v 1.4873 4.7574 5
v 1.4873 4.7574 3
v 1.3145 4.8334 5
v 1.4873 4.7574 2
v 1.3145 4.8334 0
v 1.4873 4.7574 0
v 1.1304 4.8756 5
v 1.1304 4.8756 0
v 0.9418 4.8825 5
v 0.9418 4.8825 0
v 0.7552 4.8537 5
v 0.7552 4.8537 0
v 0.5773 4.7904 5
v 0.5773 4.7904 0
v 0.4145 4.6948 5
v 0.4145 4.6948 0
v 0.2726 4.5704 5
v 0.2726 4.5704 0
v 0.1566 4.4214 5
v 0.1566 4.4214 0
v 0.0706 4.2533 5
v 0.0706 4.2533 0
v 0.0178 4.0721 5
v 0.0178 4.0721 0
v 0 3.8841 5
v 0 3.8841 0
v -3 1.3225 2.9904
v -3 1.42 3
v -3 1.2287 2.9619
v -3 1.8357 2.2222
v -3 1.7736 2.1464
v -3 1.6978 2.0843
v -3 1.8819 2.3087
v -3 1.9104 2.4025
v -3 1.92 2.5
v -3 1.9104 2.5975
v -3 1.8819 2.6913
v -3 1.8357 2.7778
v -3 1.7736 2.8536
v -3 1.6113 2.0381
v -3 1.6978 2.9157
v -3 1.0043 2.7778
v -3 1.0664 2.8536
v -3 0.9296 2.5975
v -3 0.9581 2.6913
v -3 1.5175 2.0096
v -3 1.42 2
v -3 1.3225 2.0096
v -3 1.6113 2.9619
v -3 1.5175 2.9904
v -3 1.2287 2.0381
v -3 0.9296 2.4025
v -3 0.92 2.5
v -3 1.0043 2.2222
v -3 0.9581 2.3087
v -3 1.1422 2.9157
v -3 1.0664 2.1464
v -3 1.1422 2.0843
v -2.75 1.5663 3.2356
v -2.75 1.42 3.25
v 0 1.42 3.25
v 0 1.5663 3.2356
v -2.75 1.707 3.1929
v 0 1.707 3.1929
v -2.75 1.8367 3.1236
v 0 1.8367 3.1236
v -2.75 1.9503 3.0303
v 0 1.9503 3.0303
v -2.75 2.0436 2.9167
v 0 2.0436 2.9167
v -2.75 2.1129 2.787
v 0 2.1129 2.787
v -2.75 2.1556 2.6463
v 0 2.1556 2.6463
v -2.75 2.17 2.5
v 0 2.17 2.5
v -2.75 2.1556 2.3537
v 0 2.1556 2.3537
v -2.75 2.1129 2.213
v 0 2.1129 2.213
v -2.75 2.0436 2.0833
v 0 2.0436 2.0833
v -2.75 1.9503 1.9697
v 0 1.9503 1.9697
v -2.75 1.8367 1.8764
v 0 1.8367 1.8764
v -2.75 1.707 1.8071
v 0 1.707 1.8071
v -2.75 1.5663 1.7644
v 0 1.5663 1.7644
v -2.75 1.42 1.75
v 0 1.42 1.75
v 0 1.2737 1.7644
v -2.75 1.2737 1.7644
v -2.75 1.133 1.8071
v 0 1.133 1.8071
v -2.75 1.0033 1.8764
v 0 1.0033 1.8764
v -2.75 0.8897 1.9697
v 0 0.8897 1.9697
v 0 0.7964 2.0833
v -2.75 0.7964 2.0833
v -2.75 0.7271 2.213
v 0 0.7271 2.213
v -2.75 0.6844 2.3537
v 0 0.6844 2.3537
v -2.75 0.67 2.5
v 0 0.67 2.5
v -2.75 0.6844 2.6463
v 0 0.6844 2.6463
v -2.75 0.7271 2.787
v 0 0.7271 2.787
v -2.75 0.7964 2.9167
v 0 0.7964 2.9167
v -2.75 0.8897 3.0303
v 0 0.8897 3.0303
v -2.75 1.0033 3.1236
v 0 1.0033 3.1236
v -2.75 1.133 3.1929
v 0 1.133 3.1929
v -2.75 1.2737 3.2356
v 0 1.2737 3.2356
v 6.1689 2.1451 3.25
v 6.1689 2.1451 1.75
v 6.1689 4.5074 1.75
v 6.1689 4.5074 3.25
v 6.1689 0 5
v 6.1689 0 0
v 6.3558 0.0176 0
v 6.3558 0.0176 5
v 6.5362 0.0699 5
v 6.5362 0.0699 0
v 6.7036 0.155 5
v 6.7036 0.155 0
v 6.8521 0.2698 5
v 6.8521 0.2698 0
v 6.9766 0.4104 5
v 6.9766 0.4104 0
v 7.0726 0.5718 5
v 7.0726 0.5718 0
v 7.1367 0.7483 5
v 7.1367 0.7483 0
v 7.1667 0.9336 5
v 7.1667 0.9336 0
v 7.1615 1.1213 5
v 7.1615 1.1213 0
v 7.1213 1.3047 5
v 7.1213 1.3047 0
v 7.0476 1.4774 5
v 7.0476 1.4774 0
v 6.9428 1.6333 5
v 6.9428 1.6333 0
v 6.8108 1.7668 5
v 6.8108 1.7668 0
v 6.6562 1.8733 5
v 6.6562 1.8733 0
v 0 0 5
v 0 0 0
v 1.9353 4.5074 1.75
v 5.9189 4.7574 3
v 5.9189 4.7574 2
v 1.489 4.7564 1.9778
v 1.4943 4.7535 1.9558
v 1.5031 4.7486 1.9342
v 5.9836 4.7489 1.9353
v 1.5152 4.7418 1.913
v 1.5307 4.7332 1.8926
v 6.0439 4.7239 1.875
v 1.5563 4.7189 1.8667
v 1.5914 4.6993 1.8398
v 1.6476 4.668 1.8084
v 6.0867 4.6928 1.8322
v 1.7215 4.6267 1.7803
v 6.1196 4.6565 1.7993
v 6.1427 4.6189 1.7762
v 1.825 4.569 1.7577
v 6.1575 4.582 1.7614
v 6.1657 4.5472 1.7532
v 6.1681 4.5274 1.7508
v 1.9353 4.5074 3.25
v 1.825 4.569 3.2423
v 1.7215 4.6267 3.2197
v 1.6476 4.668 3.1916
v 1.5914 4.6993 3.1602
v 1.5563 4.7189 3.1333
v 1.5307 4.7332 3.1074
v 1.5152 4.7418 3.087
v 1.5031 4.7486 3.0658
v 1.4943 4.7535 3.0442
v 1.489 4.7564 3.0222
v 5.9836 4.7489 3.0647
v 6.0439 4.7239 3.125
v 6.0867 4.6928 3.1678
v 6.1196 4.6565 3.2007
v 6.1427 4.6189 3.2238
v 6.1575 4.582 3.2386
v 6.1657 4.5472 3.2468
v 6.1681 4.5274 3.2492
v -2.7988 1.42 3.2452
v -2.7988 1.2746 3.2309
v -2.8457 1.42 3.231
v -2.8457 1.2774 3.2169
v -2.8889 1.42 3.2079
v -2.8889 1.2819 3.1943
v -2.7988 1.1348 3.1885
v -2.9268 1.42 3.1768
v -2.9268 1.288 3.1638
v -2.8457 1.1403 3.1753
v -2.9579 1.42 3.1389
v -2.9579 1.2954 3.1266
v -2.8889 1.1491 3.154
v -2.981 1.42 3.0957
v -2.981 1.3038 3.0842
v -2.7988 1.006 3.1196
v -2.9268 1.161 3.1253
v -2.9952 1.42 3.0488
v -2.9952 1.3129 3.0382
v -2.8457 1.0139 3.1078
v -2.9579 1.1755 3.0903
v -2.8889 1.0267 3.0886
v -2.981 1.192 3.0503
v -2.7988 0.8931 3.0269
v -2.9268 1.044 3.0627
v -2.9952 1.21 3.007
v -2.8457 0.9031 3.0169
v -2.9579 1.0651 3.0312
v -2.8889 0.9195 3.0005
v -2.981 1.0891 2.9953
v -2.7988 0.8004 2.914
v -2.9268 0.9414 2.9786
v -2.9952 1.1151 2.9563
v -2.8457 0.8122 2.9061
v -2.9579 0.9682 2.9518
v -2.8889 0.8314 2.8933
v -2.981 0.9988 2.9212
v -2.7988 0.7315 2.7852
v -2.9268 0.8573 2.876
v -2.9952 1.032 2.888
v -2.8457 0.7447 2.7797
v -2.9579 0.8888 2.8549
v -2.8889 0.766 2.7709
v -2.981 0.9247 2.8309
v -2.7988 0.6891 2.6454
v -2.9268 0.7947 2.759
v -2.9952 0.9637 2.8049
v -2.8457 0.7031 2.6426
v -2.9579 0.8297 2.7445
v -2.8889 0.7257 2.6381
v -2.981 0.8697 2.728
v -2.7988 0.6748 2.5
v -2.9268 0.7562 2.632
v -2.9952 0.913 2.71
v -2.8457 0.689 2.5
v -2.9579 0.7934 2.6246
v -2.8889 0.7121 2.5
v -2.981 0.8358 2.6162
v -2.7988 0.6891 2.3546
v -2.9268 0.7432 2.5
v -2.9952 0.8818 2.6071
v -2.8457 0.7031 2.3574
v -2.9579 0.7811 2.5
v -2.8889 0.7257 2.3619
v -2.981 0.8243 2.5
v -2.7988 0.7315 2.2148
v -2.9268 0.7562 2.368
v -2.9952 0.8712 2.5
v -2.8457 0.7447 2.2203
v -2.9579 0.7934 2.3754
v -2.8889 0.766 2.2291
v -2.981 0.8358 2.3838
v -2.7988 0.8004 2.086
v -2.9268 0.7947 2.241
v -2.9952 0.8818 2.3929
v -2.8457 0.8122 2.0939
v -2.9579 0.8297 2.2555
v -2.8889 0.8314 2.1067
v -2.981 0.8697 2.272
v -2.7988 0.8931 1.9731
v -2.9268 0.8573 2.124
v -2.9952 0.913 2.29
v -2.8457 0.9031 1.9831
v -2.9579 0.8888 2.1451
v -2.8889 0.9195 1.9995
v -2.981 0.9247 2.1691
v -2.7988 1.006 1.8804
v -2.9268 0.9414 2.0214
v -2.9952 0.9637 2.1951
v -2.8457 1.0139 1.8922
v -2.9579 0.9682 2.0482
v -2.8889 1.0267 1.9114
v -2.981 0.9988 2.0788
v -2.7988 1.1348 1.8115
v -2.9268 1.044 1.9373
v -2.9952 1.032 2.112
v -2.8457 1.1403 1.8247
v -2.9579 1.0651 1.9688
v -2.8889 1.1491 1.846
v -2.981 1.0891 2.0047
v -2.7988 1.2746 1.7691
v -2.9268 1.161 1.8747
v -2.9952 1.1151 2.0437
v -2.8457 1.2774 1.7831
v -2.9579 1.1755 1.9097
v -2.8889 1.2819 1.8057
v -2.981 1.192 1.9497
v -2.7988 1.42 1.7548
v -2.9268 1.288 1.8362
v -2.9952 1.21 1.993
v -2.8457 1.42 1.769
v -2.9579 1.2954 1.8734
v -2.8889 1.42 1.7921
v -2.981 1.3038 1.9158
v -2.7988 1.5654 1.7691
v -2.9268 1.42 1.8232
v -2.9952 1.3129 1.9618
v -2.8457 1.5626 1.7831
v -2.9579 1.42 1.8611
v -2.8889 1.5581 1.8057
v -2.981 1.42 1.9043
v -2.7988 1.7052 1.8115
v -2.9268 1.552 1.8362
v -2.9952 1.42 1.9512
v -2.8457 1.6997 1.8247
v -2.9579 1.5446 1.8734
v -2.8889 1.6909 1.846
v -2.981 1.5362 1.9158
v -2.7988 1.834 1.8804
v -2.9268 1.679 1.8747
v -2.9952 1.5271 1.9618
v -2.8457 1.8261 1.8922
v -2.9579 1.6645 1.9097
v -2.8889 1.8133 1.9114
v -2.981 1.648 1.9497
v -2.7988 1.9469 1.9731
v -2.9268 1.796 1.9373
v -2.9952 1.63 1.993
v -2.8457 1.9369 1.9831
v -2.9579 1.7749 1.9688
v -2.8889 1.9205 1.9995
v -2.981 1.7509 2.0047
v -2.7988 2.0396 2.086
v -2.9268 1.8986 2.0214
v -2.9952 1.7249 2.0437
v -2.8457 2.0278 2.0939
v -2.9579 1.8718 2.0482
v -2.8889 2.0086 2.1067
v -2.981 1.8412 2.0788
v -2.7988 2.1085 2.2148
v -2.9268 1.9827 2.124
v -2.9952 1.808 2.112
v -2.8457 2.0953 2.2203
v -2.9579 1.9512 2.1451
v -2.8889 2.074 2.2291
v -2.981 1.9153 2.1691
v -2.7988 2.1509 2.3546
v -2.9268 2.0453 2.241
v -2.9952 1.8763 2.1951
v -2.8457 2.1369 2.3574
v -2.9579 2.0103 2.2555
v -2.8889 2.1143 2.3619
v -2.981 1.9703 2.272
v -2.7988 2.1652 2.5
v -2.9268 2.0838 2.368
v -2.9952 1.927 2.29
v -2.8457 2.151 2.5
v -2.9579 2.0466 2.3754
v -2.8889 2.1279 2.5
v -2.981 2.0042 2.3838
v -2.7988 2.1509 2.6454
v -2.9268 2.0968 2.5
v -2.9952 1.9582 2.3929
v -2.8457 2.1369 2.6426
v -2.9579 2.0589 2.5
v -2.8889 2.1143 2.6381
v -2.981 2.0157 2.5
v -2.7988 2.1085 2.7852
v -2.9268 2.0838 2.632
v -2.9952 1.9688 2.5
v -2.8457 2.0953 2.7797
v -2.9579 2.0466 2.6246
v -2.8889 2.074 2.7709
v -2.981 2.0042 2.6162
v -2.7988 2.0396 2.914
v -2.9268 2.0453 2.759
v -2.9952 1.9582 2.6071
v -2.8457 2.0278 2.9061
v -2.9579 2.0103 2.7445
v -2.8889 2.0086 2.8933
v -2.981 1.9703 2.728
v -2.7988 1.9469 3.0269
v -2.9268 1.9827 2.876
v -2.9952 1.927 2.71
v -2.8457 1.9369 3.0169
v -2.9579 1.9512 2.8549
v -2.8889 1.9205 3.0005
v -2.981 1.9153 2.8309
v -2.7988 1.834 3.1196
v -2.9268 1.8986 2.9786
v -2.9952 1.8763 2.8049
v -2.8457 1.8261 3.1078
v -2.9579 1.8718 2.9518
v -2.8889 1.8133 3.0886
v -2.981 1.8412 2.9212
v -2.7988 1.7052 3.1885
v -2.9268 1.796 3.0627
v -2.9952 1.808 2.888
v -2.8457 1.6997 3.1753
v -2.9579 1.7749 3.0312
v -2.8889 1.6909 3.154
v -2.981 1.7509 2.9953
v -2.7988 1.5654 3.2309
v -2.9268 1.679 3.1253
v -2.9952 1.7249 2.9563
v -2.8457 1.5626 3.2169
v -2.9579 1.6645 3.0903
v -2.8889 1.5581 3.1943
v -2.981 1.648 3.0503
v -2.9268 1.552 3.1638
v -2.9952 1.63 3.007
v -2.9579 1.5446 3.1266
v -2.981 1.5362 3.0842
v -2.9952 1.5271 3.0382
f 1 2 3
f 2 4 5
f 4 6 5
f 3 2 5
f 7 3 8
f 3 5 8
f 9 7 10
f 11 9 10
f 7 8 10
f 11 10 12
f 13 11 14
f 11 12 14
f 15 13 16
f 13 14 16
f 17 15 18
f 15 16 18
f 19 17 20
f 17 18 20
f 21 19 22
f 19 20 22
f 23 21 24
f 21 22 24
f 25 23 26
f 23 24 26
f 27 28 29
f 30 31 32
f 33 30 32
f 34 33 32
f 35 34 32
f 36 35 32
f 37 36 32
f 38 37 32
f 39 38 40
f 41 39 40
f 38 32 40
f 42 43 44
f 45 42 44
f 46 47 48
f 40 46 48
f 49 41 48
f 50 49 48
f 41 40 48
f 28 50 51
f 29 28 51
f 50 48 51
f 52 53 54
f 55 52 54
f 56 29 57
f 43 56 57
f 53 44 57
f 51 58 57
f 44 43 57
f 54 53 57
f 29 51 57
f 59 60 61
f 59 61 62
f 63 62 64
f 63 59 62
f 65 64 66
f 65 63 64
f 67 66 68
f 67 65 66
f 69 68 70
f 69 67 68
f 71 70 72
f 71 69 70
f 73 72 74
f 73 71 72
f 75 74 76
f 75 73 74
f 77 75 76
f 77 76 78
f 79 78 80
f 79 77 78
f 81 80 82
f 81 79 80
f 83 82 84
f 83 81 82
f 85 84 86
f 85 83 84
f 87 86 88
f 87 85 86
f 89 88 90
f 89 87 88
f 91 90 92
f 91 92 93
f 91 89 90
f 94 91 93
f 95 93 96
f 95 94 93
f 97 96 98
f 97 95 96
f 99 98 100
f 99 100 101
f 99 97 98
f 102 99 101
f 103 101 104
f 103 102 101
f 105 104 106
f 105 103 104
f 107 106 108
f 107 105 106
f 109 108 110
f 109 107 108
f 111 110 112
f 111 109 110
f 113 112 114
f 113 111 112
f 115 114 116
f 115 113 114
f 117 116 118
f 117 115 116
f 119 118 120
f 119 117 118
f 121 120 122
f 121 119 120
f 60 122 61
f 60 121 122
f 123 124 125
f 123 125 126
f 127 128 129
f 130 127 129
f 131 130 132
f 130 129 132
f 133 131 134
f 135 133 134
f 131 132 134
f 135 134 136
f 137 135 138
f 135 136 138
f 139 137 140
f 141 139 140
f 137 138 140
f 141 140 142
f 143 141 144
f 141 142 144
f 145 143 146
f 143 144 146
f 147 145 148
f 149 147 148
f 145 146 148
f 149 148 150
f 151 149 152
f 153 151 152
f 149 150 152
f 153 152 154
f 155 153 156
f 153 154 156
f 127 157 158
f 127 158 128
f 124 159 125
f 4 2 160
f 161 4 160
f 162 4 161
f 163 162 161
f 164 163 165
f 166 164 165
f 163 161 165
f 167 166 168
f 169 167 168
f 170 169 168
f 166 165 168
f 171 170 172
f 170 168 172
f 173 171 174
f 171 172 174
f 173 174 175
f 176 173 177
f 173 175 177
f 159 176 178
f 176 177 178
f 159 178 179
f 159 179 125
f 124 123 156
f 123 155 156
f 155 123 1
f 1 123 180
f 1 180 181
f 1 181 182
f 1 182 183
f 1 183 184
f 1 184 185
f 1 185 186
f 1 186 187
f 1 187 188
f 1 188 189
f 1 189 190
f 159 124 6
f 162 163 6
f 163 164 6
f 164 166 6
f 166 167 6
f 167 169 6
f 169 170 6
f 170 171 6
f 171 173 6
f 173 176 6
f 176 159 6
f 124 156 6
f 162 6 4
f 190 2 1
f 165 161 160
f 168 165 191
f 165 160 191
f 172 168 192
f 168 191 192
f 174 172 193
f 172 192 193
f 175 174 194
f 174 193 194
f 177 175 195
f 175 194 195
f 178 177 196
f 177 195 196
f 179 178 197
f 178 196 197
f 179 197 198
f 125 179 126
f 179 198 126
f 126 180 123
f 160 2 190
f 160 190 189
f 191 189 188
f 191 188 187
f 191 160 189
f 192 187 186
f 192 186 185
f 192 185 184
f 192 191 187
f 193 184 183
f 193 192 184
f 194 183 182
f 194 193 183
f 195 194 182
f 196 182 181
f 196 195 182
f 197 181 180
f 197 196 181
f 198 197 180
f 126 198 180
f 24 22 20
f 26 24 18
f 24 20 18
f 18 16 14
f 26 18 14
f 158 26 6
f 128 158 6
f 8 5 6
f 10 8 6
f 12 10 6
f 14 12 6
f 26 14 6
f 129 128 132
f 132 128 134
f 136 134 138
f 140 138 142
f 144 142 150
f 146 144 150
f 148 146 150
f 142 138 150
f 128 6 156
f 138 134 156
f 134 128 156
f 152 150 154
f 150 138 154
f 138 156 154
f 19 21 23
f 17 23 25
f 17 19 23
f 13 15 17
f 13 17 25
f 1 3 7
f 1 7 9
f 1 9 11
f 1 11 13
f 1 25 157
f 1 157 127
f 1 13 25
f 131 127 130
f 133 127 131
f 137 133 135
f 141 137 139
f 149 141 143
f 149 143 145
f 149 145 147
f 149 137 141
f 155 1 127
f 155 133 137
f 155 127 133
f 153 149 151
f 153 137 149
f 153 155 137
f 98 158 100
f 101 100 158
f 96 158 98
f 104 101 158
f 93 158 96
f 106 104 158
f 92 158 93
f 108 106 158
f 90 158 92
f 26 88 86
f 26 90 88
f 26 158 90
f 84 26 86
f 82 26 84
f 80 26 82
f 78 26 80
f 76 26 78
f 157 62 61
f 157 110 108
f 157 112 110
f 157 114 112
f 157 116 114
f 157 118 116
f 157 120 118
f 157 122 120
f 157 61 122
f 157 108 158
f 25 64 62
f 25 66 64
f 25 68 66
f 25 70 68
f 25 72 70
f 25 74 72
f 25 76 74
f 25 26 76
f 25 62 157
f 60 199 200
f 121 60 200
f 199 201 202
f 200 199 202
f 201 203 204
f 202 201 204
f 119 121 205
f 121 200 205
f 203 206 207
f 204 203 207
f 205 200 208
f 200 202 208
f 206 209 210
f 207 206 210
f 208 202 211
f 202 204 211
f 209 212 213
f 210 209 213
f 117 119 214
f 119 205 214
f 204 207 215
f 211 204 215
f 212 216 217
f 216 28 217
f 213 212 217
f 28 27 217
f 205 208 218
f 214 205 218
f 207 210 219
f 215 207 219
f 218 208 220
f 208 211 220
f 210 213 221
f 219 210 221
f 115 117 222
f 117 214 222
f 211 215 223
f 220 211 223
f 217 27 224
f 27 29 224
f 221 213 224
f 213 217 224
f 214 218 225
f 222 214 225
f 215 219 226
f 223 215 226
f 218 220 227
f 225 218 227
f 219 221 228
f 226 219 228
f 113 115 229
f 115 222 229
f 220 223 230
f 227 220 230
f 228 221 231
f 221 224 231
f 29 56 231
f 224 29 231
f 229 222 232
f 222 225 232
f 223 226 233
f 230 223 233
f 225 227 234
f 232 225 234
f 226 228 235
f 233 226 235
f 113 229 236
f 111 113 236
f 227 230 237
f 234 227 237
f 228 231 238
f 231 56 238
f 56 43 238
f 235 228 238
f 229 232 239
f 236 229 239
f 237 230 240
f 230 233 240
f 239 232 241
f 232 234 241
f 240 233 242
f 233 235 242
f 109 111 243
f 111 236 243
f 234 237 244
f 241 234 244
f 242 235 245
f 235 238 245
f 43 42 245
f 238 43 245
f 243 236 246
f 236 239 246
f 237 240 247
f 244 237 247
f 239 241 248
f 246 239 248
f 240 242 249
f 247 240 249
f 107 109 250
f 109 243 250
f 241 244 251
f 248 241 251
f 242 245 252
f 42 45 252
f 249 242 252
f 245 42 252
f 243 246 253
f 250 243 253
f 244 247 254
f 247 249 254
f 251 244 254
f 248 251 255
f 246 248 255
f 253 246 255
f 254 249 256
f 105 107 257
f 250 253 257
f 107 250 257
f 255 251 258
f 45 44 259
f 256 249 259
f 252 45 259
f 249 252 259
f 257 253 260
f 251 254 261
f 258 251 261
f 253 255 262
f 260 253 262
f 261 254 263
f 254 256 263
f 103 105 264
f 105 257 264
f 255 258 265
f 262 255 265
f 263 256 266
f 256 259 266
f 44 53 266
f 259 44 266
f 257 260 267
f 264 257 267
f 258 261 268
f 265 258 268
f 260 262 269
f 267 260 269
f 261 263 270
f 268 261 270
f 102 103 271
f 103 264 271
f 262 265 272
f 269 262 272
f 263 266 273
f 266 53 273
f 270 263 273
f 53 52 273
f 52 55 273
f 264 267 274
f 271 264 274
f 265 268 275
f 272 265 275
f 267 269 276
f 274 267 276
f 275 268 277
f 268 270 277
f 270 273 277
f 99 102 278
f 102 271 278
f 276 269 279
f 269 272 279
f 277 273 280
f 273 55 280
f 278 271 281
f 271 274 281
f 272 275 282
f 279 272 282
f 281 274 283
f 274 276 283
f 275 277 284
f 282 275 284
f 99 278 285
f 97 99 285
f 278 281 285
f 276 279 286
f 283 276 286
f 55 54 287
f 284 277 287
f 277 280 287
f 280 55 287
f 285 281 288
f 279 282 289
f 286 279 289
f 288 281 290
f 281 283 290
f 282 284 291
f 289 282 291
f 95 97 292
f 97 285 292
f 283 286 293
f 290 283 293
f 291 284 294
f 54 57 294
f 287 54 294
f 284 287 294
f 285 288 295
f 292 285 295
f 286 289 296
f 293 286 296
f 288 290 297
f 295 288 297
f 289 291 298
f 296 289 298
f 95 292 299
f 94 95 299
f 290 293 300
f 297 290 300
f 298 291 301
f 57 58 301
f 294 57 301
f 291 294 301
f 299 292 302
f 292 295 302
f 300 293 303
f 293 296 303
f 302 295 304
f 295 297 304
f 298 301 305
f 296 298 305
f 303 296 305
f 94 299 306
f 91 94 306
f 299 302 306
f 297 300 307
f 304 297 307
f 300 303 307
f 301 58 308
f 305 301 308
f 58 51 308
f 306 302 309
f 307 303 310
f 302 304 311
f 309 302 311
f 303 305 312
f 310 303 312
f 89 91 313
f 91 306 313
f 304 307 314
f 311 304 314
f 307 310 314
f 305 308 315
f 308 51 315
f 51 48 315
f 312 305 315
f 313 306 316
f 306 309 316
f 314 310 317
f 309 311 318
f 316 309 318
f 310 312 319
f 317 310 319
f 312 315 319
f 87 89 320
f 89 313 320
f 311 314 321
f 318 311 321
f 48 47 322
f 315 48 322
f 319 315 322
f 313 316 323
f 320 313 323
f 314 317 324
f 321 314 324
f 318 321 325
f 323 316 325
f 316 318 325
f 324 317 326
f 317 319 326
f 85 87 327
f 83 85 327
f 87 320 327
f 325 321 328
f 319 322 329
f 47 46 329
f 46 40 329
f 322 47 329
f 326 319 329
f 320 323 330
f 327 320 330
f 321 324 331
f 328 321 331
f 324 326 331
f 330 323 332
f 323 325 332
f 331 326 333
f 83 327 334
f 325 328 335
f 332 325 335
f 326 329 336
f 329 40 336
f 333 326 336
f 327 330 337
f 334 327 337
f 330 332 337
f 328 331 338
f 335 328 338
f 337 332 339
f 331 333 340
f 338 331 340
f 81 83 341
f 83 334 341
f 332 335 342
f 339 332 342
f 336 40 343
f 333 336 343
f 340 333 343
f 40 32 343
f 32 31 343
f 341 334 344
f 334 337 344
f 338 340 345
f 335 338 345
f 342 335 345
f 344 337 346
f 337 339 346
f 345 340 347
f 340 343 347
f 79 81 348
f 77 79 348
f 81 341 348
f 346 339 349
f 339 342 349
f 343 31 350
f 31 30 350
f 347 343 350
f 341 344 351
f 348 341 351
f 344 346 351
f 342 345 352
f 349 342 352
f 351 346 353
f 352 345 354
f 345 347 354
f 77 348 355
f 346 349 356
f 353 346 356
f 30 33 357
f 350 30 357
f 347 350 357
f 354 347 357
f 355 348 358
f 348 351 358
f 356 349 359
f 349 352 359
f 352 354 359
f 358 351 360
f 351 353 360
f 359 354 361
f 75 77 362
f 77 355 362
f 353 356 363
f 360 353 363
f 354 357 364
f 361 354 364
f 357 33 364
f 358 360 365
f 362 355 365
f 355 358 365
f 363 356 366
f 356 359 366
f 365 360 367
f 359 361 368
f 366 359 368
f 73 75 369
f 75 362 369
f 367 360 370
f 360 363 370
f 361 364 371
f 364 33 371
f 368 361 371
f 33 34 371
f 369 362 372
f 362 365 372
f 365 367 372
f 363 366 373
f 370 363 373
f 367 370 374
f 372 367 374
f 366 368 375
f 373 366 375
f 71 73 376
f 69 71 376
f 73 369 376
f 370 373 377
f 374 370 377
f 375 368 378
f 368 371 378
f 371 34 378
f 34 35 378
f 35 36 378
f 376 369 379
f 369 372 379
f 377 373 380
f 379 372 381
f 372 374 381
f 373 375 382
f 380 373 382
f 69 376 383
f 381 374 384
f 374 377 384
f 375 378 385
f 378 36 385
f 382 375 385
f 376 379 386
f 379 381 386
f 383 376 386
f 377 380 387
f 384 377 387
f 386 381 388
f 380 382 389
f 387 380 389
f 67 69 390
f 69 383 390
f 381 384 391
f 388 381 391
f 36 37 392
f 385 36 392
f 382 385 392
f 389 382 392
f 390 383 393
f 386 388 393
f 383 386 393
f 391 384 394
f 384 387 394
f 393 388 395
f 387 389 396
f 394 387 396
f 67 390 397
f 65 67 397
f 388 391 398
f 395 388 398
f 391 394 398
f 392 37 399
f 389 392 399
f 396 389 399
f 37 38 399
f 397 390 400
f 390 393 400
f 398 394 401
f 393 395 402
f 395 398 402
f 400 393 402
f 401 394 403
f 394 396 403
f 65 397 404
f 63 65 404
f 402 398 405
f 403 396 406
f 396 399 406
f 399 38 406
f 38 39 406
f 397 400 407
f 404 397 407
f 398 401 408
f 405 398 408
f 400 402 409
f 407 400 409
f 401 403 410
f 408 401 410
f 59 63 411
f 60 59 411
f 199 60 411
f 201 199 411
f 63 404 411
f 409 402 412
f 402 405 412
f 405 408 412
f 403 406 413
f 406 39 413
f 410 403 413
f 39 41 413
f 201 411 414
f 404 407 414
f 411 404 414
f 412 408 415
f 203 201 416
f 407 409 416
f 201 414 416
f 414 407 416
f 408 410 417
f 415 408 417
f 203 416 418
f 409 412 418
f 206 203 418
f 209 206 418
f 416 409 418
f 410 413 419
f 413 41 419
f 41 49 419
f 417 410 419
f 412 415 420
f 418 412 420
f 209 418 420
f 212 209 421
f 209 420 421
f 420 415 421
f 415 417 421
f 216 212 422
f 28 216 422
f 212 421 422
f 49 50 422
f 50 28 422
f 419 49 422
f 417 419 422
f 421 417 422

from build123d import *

# Parameters (mm, degrees)
BOSS_EXTRUDE1_DEPTH = 5
SKETCH2_W           = 6.952682296
SKETCH2_H           = 2.551538718
SKETCH2_R           = 0.75
CUT_EXTRUDE1_DEPTH  = 3
SKETCH3_W           = 4.68163698
SKETCH3_H           = 1.5
BOSS_EXTRUDE2_DEPTH = 4.757403
FILLET1_R           = 0.25
FILLET2_R           = 0.25


with BuildPart() as part:
    # Sketch1 → Boss-Extrude1 (new body)
    with BuildSketch(Plane.XY):
        with BuildLine():
            Line((0, 2.17), (-3, 2.17))
            Line((-3, 2.17), (-3, 0.67))
            Line((-3, 0.67), (0, 0.67))
            Line((0, 0.67), (0, 0))
            Line((0, 0), (6.168897591, 0))
            ThreePointArc((6.168897591, 0), (7.13669318, 0.748262641), (6.656158202, 1.873256604))
            Line((6.656158202, 1.873256604), (1.487260611, 4.757403357))
            ThreePointArc((1.487260611, 4.757403357), (0.49367037, 4.74648677), (0, 3.884146753))
            Line((0, 3.884146753), (0, 2.17))
        make_face()
    extrude(amount=BOSS_EXTRUDE1_DEPTH)

    # Sketch2 → Cut-Extrude1 (cut)
    with BuildSketch(Plane.ZY.offset(3)):
        with Locations((2.401285903, 1.467822219)):
            Rectangle(SKETCH2_W, SKETCH2_H)
        with Locations((2.5, 1.42)):
            Circle(SKETCH2_R, mode=Mode.SUBTRACT)
    extrude(amount=-CUT_EXTRUDE1_DEPTH, mode=Mode.SUBTRACT)

    # Sketch3 → Boss-Extrude2 (add)
    with BuildSketch(Plane.XZ):
        with Locations((3.828079101, 2.5)):
            Rectangle(SKETCH3_W, SKETCH3_H)
    extrude(amount=-BOSS_EXTRUDE2_DEPTH)

    # Fillet1
    fillet1_edges = [part.edges().sort_by_distance(p)[0] for p in [
        (-3, 1.42, 1.75),
    ]]
    fillet(fillet1_edges, radius=FILLET1_R)

    # Fillet2
    fillet2_edges = [part.edges().sort_by_distance(p)[0] for p in [
        (3.828079101, 4.757403, 1.75),
        (3.828079101, 4.757403, 3.25),
        (6.168897591, 4.757403, 2.5),
    ]]
    fillet(fillet2_edges, radius=FILLET2_R)


solid = part.part
